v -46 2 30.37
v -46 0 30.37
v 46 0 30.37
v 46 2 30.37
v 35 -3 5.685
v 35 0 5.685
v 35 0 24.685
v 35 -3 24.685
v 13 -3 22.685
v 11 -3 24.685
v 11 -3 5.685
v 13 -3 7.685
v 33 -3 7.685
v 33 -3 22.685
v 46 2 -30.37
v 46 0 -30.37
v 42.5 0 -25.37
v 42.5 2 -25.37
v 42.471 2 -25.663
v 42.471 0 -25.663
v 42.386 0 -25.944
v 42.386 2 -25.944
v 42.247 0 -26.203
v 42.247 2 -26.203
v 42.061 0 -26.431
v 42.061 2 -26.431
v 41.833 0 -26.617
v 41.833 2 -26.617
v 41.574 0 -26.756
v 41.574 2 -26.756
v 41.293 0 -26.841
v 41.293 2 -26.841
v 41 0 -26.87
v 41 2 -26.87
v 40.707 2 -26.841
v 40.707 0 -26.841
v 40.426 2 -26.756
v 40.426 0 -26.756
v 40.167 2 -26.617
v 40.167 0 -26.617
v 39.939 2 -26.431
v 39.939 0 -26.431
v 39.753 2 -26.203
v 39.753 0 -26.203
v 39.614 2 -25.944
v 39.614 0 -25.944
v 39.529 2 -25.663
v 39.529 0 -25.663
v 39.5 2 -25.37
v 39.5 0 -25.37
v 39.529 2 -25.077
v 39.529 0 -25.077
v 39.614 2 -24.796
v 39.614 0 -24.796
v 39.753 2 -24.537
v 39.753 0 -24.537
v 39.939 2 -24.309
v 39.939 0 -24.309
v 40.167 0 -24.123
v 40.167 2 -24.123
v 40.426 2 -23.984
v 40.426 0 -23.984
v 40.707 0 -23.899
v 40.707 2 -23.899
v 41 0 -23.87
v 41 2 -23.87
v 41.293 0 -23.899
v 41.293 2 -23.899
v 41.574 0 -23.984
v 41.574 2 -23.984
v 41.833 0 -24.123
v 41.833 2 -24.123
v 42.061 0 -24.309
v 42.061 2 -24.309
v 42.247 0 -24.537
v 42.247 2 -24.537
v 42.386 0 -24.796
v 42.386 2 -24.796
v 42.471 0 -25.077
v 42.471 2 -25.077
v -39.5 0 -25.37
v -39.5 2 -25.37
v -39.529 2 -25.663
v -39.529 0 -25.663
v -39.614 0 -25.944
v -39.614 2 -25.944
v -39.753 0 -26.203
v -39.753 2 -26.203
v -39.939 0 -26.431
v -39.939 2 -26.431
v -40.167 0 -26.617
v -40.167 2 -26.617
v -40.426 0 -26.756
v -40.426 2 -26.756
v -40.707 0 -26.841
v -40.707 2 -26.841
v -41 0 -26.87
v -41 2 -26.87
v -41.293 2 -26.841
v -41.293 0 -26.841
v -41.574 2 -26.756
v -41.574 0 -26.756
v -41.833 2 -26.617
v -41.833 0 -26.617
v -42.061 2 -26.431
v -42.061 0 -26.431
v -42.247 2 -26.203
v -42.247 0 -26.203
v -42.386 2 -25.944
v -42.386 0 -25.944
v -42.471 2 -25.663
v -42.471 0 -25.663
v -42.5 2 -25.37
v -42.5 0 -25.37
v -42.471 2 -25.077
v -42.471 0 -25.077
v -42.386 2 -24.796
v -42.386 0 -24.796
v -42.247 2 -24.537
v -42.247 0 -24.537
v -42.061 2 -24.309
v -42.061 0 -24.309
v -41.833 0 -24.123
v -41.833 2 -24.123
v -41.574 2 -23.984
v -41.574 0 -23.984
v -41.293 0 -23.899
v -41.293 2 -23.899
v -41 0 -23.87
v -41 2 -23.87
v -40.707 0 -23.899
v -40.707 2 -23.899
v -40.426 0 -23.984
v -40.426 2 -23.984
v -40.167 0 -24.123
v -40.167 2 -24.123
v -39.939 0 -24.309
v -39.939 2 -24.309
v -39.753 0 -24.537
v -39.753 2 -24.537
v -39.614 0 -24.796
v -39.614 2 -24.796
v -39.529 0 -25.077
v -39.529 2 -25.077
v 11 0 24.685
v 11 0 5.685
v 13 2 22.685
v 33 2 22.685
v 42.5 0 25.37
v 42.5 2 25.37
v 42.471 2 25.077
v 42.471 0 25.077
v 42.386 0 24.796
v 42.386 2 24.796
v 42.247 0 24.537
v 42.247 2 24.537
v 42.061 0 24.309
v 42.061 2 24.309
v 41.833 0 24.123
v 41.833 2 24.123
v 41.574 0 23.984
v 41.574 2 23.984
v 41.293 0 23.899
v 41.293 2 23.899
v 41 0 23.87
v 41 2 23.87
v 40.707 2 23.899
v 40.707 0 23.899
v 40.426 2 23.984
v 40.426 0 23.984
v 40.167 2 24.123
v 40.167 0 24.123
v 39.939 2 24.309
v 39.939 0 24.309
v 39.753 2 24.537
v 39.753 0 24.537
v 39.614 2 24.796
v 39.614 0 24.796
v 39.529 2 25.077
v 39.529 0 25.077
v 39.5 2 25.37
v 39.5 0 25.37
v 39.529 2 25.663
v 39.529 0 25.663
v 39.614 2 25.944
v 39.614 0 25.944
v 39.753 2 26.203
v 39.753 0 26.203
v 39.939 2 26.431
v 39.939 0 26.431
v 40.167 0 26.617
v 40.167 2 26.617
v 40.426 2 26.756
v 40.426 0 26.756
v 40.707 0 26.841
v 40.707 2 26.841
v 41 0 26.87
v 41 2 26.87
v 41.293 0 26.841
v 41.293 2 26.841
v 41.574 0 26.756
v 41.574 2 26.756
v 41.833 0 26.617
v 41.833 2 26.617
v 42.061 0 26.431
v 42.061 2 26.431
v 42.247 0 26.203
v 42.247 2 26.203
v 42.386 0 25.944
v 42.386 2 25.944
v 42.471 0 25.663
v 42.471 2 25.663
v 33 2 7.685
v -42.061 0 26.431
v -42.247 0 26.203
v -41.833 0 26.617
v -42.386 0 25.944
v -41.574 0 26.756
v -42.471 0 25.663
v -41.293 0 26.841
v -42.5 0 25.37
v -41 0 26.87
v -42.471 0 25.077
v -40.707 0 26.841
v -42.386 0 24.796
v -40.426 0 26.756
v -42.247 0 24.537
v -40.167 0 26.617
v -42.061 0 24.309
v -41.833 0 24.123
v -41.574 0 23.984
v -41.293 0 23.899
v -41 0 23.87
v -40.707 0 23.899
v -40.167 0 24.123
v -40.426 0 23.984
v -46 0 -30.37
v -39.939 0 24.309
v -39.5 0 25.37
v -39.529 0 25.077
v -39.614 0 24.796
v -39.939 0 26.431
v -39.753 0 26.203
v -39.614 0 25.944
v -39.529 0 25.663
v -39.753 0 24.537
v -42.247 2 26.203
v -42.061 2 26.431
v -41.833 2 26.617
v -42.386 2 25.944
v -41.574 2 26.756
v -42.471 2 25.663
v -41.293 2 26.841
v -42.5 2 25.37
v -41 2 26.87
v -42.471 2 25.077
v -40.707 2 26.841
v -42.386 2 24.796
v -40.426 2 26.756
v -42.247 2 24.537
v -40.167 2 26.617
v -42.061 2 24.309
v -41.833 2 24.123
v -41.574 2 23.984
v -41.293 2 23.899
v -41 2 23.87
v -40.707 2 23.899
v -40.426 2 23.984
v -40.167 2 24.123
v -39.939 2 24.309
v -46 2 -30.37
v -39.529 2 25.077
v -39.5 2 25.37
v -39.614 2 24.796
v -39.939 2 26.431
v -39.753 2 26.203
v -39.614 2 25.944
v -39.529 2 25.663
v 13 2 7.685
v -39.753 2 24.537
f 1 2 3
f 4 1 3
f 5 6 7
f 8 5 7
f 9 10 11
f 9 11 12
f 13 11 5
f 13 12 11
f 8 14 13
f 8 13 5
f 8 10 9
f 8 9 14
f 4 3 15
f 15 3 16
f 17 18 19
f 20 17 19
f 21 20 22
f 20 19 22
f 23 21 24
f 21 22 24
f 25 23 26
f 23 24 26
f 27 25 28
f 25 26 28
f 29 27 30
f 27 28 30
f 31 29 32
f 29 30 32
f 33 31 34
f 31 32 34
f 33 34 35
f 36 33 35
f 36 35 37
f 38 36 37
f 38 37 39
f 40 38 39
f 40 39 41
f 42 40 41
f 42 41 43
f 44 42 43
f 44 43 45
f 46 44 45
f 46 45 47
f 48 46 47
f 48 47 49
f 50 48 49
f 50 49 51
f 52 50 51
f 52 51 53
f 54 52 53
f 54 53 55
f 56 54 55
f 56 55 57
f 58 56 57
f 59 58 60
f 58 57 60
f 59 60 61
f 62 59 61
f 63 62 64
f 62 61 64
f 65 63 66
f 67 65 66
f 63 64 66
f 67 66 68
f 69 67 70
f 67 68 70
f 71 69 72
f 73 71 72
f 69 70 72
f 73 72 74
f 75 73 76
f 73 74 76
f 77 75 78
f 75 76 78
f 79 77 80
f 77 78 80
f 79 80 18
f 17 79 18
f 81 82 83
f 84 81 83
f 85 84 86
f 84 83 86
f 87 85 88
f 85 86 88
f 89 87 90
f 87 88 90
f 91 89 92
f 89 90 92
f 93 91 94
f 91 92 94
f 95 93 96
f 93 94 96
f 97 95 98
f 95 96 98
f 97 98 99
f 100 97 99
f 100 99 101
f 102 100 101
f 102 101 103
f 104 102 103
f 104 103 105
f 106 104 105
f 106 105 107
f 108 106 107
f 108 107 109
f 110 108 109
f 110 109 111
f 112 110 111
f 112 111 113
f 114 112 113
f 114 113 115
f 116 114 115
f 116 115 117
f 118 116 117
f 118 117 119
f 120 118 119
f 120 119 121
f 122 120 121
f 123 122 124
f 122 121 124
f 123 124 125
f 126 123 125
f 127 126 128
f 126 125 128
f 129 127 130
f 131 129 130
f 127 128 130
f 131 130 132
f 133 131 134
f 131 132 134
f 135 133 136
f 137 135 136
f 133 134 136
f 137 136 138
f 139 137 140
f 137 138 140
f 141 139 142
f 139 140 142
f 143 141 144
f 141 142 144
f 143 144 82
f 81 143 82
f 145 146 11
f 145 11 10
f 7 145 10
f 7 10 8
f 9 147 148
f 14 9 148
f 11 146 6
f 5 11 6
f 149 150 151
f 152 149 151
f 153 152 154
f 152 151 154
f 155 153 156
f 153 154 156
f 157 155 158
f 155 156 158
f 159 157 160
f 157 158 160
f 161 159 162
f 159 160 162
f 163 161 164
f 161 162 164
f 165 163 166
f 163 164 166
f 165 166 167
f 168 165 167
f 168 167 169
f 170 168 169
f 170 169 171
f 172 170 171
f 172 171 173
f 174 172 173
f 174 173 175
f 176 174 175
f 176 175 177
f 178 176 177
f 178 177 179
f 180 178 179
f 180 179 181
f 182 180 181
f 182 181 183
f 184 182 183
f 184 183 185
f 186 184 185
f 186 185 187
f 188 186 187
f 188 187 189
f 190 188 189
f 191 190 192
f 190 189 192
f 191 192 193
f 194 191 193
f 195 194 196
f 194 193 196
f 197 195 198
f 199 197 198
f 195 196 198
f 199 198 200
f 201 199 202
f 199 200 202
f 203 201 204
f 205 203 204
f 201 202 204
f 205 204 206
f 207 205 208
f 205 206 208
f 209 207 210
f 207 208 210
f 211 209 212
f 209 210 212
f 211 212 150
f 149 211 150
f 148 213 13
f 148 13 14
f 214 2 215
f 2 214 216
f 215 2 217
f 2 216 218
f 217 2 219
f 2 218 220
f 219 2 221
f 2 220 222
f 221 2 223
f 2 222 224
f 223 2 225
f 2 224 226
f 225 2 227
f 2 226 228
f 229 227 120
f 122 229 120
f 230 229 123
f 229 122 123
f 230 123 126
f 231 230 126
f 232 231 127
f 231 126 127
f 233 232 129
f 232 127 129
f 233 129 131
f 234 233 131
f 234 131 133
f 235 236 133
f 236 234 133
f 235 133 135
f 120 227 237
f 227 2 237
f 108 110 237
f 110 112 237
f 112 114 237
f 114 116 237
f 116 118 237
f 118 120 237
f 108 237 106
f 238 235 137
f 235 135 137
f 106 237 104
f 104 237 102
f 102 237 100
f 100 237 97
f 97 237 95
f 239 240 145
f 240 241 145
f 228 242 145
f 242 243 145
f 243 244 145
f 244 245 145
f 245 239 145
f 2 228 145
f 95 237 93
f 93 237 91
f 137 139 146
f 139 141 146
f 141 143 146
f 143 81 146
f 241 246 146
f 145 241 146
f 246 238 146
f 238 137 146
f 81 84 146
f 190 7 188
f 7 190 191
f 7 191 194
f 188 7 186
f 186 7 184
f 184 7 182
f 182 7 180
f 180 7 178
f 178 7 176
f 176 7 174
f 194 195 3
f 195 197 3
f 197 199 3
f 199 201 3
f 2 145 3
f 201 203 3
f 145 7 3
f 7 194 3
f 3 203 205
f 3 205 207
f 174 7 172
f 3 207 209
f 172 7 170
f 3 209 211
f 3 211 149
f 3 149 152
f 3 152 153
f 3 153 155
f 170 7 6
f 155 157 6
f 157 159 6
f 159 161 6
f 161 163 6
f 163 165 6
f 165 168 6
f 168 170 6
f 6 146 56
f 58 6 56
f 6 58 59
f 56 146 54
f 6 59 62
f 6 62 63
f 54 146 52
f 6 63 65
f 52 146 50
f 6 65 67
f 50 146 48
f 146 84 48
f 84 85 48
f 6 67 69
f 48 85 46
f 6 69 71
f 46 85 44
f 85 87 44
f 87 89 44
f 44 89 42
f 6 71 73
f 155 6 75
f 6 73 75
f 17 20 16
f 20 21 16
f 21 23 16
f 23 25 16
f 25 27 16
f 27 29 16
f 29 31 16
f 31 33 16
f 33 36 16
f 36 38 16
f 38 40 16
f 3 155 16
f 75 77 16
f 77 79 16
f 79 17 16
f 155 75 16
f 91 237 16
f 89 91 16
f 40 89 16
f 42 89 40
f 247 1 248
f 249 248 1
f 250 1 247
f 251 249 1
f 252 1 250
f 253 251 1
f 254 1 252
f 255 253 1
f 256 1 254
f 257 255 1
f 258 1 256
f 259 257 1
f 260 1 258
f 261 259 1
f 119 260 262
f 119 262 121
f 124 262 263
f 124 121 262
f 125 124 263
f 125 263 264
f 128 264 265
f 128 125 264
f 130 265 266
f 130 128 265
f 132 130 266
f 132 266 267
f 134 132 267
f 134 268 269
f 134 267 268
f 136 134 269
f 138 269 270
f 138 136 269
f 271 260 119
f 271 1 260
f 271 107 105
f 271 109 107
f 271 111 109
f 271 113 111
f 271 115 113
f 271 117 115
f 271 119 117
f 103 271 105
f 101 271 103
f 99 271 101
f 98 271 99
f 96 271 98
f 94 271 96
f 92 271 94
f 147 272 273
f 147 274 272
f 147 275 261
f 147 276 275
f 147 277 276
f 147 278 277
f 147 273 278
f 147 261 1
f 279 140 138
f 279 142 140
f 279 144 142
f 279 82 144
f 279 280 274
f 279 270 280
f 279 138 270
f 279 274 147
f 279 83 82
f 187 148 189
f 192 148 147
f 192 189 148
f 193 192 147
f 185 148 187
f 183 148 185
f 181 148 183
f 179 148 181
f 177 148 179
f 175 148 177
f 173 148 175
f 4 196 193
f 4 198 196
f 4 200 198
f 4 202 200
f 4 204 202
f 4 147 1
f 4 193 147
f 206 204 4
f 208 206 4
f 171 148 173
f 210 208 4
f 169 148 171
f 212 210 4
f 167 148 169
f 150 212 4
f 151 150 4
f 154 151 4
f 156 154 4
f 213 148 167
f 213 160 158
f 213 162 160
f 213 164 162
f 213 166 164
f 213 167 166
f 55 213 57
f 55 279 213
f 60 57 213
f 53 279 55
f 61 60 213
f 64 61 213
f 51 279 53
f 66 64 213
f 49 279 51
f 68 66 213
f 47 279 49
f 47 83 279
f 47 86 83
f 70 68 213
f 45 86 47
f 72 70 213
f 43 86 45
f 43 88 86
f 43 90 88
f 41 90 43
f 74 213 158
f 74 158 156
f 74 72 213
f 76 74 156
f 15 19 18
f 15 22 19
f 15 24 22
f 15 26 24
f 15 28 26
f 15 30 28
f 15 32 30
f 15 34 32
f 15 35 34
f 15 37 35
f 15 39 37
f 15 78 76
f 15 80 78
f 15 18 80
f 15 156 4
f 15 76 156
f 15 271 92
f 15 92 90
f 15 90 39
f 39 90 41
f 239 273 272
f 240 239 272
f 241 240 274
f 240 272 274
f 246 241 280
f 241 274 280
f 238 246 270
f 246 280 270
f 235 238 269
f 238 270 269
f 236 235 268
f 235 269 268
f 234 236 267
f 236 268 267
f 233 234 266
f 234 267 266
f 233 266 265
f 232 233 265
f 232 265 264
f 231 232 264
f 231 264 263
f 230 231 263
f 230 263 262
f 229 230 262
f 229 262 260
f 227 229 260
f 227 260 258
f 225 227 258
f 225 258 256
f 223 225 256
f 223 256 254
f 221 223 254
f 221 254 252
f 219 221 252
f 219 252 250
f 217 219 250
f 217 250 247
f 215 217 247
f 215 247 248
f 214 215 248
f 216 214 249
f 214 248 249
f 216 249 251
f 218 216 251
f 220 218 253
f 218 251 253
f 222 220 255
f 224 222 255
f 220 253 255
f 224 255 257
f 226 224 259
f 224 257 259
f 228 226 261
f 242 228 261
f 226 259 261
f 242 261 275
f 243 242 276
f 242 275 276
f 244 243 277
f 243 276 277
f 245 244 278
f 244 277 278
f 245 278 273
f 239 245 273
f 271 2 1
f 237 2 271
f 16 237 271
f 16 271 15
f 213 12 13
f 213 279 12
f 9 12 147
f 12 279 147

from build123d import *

# Parameters (mm, degrees)
SKETCH_1_W          = 92
SKETCH_1_H          = 60.74
EXTRUDE_1_DEPTH     = 2
SKETCH_2_R          = 1.5
CUT_EXTRUDE_1_DEPTH = 10
SKETCH_3_W          = 20
SKETCH_3_H          = 15
CUT_EXTRUDE_2_DEPTH = 10
SKETCH_4_W          = 24
SKETCH_4_H          = 19
SKETCH_4_W_2        = 20
SKETCH_4_H_2        = 15
EXTRUDE_2_DEPTH     = 3


with BuildPart() as part:
    # Эскиз1 → Бобышка-Вытянуть1 (new body)
    with BuildSketch(Plane(origin=(0, 0, 0), x_dir=(1, 0, 0), z_dir=(0, 1, 0))):
        Rectangle(SKETCH_1_W, SKETCH_1_H)
    extrude(amount=EXTRUDE_1_DEPTH)

    # Эскиз2 → Вырез-Вытянуть1 (cut)
    with BuildSketch(Plane(origin=(0, 2, 0), x_dir=(1, 0, 0), z_dir=(0, 1, 0))):
        with Locations((-41, 25.37)):
            Circle(SKETCH_2_R)
        with Locations((41, 25.37)):
            Circle(SKETCH_2_R)
        with Locations((41, -25.37)):
            Circle(SKETCH_2_R)
        with Locations((-41, -25.37)):
            Circle(SKETCH_2_R)
    extrude(amount=-CUT_EXTRUDE_1_DEPTH, mode=Mode.SUBTRACT)

    # Эскиз3 → Вырез-Вытянуть2 (cut)
    with BuildSketch(Plane(origin=(0, 2, 0), x_dir=(1, 0, 0), z_dir=(0, 1, 0))):
        with Locations((23, -15.185)):
            Rectangle(SKETCH_3_W, SKETCH_3_H)
    extrude(amount=-CUT_EXTRUDE_2_DEPTH, mode=Mode.SUBTRACT)

    # Эскиз4 → Бобышка-Вытянуть2 (add)
    with BuildSketch(Plane.XZ):
        with Locations((23, 15.185)):
            Rectangle(SKETCH_4_W, SKETCH_4_H)
        with Locations((23, 15.185)):
            Rectangle(SKETCH_4_W_2, SKETCH_4_H_2, mode=Mode.SUBTRACT)
    extrude(amount=EXTRUDE_2_DEPTH)


solid = part.part
